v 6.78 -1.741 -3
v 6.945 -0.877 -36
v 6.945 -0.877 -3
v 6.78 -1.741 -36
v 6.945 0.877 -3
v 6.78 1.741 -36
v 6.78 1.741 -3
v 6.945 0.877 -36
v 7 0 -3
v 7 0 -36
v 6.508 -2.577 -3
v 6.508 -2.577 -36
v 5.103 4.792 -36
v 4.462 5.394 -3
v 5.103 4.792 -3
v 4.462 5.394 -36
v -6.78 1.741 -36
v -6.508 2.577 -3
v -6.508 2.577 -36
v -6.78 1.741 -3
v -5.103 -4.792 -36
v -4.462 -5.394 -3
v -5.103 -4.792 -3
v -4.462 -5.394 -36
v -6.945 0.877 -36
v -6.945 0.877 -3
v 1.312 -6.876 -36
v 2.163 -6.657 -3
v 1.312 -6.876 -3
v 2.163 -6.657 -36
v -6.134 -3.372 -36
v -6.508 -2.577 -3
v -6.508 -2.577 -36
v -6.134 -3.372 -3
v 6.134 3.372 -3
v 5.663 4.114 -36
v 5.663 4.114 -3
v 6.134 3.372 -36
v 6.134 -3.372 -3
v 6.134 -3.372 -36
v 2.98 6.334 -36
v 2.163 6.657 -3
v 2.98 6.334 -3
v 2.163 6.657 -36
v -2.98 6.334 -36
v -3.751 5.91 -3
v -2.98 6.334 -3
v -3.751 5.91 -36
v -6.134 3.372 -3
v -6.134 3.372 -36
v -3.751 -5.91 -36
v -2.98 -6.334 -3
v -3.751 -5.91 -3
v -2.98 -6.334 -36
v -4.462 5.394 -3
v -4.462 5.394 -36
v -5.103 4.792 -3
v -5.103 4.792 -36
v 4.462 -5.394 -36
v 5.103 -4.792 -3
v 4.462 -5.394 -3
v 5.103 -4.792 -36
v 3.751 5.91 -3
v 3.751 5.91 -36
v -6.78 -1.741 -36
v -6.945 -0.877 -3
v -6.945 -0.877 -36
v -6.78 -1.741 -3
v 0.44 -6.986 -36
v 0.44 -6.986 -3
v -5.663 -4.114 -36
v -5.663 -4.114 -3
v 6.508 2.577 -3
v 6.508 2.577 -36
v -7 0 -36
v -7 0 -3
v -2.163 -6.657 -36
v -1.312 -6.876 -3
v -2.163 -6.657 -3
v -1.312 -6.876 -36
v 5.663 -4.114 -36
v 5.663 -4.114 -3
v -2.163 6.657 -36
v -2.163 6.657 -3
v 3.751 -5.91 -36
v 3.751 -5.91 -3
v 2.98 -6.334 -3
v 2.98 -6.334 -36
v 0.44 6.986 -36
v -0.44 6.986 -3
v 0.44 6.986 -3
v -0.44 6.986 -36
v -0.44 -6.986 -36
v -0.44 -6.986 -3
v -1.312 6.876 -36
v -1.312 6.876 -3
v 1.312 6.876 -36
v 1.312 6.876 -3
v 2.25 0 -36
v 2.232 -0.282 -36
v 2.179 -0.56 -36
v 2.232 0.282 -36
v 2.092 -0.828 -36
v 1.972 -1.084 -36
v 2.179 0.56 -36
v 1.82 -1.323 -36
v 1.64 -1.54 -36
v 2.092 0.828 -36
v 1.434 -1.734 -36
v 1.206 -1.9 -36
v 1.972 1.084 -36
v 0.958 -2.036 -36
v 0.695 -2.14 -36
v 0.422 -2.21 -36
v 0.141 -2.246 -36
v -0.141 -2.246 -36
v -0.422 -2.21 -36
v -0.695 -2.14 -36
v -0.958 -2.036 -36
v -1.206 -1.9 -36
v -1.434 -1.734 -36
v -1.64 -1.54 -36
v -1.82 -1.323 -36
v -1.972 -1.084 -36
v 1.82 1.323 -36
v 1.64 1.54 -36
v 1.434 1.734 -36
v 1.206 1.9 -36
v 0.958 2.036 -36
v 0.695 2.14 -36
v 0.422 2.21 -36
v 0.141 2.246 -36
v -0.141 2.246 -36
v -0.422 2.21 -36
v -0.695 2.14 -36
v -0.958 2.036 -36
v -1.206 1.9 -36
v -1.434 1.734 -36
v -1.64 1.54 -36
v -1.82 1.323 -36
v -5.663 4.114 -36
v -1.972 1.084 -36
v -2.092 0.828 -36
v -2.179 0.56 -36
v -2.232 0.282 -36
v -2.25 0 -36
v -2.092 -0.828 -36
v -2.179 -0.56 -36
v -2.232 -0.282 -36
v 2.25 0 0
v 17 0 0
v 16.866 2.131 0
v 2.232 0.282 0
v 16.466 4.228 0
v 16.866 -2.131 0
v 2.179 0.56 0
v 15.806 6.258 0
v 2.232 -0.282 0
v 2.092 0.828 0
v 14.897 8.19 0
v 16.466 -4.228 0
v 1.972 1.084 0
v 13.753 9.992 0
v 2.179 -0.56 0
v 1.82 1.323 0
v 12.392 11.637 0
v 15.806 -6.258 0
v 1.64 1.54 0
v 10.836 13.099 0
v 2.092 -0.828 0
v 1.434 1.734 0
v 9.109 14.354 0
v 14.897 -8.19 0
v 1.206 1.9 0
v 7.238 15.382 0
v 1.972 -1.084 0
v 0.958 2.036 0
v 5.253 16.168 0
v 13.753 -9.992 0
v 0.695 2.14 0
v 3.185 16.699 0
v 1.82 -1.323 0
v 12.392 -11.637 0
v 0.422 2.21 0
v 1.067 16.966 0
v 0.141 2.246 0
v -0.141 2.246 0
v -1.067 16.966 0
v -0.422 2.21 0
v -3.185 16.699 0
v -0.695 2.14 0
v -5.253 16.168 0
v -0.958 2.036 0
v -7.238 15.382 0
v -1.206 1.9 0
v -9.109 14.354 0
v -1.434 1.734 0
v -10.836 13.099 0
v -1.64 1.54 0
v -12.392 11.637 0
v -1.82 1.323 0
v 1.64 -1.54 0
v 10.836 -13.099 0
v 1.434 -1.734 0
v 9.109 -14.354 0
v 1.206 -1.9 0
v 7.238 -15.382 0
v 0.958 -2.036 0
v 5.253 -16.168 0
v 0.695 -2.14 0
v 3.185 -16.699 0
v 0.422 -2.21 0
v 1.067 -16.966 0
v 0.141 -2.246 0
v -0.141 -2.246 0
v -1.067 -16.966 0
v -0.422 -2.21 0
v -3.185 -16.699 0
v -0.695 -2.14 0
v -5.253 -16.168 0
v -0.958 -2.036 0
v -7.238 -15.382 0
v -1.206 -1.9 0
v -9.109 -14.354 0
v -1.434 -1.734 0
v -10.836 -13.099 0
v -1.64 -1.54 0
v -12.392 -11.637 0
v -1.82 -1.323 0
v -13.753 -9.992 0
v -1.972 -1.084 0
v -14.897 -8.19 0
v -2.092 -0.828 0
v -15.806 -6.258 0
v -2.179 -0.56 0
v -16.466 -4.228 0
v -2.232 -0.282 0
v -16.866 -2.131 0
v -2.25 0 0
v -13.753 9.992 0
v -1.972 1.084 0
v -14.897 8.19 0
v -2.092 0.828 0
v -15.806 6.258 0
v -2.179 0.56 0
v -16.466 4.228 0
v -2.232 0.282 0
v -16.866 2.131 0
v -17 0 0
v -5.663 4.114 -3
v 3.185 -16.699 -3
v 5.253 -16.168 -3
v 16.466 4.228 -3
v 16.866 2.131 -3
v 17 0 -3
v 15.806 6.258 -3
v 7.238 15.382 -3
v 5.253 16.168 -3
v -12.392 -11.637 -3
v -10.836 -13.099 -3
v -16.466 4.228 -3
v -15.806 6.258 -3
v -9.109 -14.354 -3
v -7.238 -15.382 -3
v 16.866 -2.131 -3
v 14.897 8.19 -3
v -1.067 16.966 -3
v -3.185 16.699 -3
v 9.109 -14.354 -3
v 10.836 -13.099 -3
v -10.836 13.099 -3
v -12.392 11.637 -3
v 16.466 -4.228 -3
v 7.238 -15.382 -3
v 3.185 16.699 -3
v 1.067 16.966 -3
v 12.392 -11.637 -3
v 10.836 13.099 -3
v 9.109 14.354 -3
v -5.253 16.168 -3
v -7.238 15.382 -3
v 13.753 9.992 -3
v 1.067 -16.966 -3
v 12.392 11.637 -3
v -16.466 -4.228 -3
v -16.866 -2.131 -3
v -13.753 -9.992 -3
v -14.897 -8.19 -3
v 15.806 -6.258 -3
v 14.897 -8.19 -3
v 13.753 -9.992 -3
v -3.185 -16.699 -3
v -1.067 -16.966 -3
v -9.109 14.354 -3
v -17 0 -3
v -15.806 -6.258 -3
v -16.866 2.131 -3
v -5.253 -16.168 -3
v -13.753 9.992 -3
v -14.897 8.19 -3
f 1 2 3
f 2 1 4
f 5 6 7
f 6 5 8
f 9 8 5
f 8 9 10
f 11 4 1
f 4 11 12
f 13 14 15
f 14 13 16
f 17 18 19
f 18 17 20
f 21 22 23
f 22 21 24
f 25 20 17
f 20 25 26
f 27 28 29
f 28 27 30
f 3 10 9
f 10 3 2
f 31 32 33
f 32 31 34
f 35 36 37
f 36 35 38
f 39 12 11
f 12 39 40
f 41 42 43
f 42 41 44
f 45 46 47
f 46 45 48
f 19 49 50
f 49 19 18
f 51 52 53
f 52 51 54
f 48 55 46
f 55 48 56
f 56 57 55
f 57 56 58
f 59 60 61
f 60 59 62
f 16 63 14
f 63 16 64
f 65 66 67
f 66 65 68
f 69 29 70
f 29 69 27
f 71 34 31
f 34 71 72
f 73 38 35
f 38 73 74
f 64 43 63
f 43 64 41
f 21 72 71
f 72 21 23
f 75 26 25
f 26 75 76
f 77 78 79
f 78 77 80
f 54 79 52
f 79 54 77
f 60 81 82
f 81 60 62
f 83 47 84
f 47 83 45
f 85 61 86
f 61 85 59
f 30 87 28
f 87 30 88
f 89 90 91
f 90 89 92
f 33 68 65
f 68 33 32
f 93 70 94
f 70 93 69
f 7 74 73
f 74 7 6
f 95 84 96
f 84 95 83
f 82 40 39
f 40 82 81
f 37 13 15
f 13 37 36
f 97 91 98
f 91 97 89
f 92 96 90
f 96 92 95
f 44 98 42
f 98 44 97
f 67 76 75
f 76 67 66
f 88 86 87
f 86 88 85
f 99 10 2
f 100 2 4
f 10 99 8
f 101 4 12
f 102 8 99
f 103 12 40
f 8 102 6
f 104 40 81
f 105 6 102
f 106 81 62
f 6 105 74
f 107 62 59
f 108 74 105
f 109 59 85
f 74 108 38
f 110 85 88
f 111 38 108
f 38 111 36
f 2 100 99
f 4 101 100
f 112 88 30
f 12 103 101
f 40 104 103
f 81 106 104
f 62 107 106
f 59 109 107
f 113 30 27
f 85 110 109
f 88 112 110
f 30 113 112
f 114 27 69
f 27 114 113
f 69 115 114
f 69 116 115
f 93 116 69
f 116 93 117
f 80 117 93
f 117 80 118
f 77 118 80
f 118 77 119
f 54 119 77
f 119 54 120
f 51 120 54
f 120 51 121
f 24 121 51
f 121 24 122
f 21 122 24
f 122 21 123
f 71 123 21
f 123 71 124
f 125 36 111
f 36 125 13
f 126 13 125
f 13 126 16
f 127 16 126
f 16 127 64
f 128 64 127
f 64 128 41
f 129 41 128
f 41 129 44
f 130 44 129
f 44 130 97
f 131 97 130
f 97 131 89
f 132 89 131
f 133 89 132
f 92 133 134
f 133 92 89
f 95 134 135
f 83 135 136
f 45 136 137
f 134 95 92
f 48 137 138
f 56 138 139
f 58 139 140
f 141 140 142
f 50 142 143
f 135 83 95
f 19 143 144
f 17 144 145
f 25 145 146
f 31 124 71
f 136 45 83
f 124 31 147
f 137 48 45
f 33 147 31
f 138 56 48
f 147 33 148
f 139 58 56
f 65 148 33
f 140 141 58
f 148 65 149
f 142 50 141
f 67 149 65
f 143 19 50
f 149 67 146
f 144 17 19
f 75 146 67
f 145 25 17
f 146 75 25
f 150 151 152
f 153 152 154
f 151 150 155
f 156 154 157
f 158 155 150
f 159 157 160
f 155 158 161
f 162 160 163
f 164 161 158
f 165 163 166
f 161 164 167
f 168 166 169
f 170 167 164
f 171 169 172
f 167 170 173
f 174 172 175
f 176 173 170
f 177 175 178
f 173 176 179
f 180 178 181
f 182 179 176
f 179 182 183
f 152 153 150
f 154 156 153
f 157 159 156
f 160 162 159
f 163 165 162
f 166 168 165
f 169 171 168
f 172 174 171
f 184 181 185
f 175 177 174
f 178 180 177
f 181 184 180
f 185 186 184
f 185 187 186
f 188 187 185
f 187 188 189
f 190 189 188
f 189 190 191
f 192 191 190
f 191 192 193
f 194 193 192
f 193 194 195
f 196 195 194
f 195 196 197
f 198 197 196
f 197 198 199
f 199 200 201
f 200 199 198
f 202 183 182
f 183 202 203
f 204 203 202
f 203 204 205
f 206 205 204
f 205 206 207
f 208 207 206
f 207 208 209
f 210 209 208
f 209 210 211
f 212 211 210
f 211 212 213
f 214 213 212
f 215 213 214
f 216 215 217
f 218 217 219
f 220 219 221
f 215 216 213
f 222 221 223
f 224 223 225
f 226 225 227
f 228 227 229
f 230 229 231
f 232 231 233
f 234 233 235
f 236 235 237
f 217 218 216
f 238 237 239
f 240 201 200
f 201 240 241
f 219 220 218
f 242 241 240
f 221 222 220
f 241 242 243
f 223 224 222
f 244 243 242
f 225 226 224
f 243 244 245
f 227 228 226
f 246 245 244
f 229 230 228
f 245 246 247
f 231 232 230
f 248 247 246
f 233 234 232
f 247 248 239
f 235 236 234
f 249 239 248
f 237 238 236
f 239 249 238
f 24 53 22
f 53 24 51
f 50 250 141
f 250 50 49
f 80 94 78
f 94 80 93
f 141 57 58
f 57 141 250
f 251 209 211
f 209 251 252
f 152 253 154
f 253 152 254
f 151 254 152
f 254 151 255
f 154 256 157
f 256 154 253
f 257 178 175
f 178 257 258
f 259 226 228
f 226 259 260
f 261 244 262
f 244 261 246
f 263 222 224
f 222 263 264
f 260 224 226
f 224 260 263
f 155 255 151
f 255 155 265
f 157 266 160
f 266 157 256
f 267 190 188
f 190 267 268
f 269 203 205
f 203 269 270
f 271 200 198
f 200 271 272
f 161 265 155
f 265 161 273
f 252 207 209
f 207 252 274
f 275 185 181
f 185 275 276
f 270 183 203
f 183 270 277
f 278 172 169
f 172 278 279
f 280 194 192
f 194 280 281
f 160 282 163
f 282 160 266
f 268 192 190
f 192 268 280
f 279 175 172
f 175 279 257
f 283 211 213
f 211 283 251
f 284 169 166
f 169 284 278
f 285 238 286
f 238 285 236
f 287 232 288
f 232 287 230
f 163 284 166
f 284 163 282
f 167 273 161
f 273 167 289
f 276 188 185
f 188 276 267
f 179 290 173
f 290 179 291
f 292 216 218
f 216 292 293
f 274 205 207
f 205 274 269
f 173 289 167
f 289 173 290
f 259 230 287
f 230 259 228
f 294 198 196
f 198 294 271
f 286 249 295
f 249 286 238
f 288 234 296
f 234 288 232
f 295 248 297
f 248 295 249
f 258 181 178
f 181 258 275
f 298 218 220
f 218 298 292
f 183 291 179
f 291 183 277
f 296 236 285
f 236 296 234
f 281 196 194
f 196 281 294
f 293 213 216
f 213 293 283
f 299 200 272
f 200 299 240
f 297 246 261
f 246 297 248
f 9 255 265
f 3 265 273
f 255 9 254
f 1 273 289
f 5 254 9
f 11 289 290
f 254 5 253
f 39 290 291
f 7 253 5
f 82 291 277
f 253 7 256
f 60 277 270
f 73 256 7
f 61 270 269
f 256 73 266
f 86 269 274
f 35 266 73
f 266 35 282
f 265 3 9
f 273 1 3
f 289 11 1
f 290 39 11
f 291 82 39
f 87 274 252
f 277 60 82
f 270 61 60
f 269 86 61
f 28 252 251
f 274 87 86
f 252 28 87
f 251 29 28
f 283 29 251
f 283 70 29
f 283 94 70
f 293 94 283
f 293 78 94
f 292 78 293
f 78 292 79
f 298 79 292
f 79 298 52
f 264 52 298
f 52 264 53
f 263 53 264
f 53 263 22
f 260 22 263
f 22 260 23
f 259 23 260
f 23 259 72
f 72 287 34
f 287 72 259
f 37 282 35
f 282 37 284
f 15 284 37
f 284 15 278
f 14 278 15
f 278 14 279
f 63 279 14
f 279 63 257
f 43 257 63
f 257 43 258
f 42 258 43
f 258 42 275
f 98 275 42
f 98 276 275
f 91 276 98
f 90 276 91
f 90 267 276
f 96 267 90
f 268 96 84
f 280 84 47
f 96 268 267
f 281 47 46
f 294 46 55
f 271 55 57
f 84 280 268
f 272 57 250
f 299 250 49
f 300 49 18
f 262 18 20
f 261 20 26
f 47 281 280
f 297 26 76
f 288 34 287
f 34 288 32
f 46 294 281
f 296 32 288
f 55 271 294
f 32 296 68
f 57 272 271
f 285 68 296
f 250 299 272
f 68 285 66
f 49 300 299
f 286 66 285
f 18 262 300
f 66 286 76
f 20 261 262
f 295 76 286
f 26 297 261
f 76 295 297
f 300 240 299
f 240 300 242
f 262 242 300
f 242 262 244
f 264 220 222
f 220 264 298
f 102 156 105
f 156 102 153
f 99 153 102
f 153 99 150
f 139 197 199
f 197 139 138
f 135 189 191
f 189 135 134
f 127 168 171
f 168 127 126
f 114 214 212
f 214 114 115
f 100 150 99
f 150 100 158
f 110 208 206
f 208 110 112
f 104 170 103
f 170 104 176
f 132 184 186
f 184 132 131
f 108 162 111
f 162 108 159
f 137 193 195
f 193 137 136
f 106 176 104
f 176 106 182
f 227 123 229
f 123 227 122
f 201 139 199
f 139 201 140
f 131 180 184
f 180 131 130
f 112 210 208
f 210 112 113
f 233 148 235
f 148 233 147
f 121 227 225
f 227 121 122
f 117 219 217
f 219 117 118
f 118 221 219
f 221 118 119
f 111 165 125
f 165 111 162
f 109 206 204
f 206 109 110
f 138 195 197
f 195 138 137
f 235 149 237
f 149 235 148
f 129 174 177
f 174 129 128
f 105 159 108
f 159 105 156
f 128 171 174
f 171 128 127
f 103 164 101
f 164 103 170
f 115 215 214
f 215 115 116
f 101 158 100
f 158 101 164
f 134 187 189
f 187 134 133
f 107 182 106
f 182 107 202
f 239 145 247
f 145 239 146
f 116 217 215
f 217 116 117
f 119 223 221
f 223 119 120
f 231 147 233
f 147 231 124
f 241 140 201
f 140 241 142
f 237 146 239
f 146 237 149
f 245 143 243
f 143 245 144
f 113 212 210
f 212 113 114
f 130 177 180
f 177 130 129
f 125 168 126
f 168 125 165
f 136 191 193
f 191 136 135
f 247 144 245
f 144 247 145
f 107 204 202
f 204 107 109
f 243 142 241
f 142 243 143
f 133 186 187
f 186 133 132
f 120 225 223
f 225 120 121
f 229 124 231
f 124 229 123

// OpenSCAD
$fn = 50;


difference() {
	union() {
		translate(v = [0, 0, -36.0000000000]) {
			cylinder(h = 36, r = 7.0000000000);
		}
		translate(v = [0, 0, -3.0000000000]) {
			cylinder(h = 3, r = 17.0000000000);
		}
	}
	union() {
		#translate(v = [0, 0, -36]) {
			cylinder(h = 36, r = 2.2500000000);
		}
	}
}
